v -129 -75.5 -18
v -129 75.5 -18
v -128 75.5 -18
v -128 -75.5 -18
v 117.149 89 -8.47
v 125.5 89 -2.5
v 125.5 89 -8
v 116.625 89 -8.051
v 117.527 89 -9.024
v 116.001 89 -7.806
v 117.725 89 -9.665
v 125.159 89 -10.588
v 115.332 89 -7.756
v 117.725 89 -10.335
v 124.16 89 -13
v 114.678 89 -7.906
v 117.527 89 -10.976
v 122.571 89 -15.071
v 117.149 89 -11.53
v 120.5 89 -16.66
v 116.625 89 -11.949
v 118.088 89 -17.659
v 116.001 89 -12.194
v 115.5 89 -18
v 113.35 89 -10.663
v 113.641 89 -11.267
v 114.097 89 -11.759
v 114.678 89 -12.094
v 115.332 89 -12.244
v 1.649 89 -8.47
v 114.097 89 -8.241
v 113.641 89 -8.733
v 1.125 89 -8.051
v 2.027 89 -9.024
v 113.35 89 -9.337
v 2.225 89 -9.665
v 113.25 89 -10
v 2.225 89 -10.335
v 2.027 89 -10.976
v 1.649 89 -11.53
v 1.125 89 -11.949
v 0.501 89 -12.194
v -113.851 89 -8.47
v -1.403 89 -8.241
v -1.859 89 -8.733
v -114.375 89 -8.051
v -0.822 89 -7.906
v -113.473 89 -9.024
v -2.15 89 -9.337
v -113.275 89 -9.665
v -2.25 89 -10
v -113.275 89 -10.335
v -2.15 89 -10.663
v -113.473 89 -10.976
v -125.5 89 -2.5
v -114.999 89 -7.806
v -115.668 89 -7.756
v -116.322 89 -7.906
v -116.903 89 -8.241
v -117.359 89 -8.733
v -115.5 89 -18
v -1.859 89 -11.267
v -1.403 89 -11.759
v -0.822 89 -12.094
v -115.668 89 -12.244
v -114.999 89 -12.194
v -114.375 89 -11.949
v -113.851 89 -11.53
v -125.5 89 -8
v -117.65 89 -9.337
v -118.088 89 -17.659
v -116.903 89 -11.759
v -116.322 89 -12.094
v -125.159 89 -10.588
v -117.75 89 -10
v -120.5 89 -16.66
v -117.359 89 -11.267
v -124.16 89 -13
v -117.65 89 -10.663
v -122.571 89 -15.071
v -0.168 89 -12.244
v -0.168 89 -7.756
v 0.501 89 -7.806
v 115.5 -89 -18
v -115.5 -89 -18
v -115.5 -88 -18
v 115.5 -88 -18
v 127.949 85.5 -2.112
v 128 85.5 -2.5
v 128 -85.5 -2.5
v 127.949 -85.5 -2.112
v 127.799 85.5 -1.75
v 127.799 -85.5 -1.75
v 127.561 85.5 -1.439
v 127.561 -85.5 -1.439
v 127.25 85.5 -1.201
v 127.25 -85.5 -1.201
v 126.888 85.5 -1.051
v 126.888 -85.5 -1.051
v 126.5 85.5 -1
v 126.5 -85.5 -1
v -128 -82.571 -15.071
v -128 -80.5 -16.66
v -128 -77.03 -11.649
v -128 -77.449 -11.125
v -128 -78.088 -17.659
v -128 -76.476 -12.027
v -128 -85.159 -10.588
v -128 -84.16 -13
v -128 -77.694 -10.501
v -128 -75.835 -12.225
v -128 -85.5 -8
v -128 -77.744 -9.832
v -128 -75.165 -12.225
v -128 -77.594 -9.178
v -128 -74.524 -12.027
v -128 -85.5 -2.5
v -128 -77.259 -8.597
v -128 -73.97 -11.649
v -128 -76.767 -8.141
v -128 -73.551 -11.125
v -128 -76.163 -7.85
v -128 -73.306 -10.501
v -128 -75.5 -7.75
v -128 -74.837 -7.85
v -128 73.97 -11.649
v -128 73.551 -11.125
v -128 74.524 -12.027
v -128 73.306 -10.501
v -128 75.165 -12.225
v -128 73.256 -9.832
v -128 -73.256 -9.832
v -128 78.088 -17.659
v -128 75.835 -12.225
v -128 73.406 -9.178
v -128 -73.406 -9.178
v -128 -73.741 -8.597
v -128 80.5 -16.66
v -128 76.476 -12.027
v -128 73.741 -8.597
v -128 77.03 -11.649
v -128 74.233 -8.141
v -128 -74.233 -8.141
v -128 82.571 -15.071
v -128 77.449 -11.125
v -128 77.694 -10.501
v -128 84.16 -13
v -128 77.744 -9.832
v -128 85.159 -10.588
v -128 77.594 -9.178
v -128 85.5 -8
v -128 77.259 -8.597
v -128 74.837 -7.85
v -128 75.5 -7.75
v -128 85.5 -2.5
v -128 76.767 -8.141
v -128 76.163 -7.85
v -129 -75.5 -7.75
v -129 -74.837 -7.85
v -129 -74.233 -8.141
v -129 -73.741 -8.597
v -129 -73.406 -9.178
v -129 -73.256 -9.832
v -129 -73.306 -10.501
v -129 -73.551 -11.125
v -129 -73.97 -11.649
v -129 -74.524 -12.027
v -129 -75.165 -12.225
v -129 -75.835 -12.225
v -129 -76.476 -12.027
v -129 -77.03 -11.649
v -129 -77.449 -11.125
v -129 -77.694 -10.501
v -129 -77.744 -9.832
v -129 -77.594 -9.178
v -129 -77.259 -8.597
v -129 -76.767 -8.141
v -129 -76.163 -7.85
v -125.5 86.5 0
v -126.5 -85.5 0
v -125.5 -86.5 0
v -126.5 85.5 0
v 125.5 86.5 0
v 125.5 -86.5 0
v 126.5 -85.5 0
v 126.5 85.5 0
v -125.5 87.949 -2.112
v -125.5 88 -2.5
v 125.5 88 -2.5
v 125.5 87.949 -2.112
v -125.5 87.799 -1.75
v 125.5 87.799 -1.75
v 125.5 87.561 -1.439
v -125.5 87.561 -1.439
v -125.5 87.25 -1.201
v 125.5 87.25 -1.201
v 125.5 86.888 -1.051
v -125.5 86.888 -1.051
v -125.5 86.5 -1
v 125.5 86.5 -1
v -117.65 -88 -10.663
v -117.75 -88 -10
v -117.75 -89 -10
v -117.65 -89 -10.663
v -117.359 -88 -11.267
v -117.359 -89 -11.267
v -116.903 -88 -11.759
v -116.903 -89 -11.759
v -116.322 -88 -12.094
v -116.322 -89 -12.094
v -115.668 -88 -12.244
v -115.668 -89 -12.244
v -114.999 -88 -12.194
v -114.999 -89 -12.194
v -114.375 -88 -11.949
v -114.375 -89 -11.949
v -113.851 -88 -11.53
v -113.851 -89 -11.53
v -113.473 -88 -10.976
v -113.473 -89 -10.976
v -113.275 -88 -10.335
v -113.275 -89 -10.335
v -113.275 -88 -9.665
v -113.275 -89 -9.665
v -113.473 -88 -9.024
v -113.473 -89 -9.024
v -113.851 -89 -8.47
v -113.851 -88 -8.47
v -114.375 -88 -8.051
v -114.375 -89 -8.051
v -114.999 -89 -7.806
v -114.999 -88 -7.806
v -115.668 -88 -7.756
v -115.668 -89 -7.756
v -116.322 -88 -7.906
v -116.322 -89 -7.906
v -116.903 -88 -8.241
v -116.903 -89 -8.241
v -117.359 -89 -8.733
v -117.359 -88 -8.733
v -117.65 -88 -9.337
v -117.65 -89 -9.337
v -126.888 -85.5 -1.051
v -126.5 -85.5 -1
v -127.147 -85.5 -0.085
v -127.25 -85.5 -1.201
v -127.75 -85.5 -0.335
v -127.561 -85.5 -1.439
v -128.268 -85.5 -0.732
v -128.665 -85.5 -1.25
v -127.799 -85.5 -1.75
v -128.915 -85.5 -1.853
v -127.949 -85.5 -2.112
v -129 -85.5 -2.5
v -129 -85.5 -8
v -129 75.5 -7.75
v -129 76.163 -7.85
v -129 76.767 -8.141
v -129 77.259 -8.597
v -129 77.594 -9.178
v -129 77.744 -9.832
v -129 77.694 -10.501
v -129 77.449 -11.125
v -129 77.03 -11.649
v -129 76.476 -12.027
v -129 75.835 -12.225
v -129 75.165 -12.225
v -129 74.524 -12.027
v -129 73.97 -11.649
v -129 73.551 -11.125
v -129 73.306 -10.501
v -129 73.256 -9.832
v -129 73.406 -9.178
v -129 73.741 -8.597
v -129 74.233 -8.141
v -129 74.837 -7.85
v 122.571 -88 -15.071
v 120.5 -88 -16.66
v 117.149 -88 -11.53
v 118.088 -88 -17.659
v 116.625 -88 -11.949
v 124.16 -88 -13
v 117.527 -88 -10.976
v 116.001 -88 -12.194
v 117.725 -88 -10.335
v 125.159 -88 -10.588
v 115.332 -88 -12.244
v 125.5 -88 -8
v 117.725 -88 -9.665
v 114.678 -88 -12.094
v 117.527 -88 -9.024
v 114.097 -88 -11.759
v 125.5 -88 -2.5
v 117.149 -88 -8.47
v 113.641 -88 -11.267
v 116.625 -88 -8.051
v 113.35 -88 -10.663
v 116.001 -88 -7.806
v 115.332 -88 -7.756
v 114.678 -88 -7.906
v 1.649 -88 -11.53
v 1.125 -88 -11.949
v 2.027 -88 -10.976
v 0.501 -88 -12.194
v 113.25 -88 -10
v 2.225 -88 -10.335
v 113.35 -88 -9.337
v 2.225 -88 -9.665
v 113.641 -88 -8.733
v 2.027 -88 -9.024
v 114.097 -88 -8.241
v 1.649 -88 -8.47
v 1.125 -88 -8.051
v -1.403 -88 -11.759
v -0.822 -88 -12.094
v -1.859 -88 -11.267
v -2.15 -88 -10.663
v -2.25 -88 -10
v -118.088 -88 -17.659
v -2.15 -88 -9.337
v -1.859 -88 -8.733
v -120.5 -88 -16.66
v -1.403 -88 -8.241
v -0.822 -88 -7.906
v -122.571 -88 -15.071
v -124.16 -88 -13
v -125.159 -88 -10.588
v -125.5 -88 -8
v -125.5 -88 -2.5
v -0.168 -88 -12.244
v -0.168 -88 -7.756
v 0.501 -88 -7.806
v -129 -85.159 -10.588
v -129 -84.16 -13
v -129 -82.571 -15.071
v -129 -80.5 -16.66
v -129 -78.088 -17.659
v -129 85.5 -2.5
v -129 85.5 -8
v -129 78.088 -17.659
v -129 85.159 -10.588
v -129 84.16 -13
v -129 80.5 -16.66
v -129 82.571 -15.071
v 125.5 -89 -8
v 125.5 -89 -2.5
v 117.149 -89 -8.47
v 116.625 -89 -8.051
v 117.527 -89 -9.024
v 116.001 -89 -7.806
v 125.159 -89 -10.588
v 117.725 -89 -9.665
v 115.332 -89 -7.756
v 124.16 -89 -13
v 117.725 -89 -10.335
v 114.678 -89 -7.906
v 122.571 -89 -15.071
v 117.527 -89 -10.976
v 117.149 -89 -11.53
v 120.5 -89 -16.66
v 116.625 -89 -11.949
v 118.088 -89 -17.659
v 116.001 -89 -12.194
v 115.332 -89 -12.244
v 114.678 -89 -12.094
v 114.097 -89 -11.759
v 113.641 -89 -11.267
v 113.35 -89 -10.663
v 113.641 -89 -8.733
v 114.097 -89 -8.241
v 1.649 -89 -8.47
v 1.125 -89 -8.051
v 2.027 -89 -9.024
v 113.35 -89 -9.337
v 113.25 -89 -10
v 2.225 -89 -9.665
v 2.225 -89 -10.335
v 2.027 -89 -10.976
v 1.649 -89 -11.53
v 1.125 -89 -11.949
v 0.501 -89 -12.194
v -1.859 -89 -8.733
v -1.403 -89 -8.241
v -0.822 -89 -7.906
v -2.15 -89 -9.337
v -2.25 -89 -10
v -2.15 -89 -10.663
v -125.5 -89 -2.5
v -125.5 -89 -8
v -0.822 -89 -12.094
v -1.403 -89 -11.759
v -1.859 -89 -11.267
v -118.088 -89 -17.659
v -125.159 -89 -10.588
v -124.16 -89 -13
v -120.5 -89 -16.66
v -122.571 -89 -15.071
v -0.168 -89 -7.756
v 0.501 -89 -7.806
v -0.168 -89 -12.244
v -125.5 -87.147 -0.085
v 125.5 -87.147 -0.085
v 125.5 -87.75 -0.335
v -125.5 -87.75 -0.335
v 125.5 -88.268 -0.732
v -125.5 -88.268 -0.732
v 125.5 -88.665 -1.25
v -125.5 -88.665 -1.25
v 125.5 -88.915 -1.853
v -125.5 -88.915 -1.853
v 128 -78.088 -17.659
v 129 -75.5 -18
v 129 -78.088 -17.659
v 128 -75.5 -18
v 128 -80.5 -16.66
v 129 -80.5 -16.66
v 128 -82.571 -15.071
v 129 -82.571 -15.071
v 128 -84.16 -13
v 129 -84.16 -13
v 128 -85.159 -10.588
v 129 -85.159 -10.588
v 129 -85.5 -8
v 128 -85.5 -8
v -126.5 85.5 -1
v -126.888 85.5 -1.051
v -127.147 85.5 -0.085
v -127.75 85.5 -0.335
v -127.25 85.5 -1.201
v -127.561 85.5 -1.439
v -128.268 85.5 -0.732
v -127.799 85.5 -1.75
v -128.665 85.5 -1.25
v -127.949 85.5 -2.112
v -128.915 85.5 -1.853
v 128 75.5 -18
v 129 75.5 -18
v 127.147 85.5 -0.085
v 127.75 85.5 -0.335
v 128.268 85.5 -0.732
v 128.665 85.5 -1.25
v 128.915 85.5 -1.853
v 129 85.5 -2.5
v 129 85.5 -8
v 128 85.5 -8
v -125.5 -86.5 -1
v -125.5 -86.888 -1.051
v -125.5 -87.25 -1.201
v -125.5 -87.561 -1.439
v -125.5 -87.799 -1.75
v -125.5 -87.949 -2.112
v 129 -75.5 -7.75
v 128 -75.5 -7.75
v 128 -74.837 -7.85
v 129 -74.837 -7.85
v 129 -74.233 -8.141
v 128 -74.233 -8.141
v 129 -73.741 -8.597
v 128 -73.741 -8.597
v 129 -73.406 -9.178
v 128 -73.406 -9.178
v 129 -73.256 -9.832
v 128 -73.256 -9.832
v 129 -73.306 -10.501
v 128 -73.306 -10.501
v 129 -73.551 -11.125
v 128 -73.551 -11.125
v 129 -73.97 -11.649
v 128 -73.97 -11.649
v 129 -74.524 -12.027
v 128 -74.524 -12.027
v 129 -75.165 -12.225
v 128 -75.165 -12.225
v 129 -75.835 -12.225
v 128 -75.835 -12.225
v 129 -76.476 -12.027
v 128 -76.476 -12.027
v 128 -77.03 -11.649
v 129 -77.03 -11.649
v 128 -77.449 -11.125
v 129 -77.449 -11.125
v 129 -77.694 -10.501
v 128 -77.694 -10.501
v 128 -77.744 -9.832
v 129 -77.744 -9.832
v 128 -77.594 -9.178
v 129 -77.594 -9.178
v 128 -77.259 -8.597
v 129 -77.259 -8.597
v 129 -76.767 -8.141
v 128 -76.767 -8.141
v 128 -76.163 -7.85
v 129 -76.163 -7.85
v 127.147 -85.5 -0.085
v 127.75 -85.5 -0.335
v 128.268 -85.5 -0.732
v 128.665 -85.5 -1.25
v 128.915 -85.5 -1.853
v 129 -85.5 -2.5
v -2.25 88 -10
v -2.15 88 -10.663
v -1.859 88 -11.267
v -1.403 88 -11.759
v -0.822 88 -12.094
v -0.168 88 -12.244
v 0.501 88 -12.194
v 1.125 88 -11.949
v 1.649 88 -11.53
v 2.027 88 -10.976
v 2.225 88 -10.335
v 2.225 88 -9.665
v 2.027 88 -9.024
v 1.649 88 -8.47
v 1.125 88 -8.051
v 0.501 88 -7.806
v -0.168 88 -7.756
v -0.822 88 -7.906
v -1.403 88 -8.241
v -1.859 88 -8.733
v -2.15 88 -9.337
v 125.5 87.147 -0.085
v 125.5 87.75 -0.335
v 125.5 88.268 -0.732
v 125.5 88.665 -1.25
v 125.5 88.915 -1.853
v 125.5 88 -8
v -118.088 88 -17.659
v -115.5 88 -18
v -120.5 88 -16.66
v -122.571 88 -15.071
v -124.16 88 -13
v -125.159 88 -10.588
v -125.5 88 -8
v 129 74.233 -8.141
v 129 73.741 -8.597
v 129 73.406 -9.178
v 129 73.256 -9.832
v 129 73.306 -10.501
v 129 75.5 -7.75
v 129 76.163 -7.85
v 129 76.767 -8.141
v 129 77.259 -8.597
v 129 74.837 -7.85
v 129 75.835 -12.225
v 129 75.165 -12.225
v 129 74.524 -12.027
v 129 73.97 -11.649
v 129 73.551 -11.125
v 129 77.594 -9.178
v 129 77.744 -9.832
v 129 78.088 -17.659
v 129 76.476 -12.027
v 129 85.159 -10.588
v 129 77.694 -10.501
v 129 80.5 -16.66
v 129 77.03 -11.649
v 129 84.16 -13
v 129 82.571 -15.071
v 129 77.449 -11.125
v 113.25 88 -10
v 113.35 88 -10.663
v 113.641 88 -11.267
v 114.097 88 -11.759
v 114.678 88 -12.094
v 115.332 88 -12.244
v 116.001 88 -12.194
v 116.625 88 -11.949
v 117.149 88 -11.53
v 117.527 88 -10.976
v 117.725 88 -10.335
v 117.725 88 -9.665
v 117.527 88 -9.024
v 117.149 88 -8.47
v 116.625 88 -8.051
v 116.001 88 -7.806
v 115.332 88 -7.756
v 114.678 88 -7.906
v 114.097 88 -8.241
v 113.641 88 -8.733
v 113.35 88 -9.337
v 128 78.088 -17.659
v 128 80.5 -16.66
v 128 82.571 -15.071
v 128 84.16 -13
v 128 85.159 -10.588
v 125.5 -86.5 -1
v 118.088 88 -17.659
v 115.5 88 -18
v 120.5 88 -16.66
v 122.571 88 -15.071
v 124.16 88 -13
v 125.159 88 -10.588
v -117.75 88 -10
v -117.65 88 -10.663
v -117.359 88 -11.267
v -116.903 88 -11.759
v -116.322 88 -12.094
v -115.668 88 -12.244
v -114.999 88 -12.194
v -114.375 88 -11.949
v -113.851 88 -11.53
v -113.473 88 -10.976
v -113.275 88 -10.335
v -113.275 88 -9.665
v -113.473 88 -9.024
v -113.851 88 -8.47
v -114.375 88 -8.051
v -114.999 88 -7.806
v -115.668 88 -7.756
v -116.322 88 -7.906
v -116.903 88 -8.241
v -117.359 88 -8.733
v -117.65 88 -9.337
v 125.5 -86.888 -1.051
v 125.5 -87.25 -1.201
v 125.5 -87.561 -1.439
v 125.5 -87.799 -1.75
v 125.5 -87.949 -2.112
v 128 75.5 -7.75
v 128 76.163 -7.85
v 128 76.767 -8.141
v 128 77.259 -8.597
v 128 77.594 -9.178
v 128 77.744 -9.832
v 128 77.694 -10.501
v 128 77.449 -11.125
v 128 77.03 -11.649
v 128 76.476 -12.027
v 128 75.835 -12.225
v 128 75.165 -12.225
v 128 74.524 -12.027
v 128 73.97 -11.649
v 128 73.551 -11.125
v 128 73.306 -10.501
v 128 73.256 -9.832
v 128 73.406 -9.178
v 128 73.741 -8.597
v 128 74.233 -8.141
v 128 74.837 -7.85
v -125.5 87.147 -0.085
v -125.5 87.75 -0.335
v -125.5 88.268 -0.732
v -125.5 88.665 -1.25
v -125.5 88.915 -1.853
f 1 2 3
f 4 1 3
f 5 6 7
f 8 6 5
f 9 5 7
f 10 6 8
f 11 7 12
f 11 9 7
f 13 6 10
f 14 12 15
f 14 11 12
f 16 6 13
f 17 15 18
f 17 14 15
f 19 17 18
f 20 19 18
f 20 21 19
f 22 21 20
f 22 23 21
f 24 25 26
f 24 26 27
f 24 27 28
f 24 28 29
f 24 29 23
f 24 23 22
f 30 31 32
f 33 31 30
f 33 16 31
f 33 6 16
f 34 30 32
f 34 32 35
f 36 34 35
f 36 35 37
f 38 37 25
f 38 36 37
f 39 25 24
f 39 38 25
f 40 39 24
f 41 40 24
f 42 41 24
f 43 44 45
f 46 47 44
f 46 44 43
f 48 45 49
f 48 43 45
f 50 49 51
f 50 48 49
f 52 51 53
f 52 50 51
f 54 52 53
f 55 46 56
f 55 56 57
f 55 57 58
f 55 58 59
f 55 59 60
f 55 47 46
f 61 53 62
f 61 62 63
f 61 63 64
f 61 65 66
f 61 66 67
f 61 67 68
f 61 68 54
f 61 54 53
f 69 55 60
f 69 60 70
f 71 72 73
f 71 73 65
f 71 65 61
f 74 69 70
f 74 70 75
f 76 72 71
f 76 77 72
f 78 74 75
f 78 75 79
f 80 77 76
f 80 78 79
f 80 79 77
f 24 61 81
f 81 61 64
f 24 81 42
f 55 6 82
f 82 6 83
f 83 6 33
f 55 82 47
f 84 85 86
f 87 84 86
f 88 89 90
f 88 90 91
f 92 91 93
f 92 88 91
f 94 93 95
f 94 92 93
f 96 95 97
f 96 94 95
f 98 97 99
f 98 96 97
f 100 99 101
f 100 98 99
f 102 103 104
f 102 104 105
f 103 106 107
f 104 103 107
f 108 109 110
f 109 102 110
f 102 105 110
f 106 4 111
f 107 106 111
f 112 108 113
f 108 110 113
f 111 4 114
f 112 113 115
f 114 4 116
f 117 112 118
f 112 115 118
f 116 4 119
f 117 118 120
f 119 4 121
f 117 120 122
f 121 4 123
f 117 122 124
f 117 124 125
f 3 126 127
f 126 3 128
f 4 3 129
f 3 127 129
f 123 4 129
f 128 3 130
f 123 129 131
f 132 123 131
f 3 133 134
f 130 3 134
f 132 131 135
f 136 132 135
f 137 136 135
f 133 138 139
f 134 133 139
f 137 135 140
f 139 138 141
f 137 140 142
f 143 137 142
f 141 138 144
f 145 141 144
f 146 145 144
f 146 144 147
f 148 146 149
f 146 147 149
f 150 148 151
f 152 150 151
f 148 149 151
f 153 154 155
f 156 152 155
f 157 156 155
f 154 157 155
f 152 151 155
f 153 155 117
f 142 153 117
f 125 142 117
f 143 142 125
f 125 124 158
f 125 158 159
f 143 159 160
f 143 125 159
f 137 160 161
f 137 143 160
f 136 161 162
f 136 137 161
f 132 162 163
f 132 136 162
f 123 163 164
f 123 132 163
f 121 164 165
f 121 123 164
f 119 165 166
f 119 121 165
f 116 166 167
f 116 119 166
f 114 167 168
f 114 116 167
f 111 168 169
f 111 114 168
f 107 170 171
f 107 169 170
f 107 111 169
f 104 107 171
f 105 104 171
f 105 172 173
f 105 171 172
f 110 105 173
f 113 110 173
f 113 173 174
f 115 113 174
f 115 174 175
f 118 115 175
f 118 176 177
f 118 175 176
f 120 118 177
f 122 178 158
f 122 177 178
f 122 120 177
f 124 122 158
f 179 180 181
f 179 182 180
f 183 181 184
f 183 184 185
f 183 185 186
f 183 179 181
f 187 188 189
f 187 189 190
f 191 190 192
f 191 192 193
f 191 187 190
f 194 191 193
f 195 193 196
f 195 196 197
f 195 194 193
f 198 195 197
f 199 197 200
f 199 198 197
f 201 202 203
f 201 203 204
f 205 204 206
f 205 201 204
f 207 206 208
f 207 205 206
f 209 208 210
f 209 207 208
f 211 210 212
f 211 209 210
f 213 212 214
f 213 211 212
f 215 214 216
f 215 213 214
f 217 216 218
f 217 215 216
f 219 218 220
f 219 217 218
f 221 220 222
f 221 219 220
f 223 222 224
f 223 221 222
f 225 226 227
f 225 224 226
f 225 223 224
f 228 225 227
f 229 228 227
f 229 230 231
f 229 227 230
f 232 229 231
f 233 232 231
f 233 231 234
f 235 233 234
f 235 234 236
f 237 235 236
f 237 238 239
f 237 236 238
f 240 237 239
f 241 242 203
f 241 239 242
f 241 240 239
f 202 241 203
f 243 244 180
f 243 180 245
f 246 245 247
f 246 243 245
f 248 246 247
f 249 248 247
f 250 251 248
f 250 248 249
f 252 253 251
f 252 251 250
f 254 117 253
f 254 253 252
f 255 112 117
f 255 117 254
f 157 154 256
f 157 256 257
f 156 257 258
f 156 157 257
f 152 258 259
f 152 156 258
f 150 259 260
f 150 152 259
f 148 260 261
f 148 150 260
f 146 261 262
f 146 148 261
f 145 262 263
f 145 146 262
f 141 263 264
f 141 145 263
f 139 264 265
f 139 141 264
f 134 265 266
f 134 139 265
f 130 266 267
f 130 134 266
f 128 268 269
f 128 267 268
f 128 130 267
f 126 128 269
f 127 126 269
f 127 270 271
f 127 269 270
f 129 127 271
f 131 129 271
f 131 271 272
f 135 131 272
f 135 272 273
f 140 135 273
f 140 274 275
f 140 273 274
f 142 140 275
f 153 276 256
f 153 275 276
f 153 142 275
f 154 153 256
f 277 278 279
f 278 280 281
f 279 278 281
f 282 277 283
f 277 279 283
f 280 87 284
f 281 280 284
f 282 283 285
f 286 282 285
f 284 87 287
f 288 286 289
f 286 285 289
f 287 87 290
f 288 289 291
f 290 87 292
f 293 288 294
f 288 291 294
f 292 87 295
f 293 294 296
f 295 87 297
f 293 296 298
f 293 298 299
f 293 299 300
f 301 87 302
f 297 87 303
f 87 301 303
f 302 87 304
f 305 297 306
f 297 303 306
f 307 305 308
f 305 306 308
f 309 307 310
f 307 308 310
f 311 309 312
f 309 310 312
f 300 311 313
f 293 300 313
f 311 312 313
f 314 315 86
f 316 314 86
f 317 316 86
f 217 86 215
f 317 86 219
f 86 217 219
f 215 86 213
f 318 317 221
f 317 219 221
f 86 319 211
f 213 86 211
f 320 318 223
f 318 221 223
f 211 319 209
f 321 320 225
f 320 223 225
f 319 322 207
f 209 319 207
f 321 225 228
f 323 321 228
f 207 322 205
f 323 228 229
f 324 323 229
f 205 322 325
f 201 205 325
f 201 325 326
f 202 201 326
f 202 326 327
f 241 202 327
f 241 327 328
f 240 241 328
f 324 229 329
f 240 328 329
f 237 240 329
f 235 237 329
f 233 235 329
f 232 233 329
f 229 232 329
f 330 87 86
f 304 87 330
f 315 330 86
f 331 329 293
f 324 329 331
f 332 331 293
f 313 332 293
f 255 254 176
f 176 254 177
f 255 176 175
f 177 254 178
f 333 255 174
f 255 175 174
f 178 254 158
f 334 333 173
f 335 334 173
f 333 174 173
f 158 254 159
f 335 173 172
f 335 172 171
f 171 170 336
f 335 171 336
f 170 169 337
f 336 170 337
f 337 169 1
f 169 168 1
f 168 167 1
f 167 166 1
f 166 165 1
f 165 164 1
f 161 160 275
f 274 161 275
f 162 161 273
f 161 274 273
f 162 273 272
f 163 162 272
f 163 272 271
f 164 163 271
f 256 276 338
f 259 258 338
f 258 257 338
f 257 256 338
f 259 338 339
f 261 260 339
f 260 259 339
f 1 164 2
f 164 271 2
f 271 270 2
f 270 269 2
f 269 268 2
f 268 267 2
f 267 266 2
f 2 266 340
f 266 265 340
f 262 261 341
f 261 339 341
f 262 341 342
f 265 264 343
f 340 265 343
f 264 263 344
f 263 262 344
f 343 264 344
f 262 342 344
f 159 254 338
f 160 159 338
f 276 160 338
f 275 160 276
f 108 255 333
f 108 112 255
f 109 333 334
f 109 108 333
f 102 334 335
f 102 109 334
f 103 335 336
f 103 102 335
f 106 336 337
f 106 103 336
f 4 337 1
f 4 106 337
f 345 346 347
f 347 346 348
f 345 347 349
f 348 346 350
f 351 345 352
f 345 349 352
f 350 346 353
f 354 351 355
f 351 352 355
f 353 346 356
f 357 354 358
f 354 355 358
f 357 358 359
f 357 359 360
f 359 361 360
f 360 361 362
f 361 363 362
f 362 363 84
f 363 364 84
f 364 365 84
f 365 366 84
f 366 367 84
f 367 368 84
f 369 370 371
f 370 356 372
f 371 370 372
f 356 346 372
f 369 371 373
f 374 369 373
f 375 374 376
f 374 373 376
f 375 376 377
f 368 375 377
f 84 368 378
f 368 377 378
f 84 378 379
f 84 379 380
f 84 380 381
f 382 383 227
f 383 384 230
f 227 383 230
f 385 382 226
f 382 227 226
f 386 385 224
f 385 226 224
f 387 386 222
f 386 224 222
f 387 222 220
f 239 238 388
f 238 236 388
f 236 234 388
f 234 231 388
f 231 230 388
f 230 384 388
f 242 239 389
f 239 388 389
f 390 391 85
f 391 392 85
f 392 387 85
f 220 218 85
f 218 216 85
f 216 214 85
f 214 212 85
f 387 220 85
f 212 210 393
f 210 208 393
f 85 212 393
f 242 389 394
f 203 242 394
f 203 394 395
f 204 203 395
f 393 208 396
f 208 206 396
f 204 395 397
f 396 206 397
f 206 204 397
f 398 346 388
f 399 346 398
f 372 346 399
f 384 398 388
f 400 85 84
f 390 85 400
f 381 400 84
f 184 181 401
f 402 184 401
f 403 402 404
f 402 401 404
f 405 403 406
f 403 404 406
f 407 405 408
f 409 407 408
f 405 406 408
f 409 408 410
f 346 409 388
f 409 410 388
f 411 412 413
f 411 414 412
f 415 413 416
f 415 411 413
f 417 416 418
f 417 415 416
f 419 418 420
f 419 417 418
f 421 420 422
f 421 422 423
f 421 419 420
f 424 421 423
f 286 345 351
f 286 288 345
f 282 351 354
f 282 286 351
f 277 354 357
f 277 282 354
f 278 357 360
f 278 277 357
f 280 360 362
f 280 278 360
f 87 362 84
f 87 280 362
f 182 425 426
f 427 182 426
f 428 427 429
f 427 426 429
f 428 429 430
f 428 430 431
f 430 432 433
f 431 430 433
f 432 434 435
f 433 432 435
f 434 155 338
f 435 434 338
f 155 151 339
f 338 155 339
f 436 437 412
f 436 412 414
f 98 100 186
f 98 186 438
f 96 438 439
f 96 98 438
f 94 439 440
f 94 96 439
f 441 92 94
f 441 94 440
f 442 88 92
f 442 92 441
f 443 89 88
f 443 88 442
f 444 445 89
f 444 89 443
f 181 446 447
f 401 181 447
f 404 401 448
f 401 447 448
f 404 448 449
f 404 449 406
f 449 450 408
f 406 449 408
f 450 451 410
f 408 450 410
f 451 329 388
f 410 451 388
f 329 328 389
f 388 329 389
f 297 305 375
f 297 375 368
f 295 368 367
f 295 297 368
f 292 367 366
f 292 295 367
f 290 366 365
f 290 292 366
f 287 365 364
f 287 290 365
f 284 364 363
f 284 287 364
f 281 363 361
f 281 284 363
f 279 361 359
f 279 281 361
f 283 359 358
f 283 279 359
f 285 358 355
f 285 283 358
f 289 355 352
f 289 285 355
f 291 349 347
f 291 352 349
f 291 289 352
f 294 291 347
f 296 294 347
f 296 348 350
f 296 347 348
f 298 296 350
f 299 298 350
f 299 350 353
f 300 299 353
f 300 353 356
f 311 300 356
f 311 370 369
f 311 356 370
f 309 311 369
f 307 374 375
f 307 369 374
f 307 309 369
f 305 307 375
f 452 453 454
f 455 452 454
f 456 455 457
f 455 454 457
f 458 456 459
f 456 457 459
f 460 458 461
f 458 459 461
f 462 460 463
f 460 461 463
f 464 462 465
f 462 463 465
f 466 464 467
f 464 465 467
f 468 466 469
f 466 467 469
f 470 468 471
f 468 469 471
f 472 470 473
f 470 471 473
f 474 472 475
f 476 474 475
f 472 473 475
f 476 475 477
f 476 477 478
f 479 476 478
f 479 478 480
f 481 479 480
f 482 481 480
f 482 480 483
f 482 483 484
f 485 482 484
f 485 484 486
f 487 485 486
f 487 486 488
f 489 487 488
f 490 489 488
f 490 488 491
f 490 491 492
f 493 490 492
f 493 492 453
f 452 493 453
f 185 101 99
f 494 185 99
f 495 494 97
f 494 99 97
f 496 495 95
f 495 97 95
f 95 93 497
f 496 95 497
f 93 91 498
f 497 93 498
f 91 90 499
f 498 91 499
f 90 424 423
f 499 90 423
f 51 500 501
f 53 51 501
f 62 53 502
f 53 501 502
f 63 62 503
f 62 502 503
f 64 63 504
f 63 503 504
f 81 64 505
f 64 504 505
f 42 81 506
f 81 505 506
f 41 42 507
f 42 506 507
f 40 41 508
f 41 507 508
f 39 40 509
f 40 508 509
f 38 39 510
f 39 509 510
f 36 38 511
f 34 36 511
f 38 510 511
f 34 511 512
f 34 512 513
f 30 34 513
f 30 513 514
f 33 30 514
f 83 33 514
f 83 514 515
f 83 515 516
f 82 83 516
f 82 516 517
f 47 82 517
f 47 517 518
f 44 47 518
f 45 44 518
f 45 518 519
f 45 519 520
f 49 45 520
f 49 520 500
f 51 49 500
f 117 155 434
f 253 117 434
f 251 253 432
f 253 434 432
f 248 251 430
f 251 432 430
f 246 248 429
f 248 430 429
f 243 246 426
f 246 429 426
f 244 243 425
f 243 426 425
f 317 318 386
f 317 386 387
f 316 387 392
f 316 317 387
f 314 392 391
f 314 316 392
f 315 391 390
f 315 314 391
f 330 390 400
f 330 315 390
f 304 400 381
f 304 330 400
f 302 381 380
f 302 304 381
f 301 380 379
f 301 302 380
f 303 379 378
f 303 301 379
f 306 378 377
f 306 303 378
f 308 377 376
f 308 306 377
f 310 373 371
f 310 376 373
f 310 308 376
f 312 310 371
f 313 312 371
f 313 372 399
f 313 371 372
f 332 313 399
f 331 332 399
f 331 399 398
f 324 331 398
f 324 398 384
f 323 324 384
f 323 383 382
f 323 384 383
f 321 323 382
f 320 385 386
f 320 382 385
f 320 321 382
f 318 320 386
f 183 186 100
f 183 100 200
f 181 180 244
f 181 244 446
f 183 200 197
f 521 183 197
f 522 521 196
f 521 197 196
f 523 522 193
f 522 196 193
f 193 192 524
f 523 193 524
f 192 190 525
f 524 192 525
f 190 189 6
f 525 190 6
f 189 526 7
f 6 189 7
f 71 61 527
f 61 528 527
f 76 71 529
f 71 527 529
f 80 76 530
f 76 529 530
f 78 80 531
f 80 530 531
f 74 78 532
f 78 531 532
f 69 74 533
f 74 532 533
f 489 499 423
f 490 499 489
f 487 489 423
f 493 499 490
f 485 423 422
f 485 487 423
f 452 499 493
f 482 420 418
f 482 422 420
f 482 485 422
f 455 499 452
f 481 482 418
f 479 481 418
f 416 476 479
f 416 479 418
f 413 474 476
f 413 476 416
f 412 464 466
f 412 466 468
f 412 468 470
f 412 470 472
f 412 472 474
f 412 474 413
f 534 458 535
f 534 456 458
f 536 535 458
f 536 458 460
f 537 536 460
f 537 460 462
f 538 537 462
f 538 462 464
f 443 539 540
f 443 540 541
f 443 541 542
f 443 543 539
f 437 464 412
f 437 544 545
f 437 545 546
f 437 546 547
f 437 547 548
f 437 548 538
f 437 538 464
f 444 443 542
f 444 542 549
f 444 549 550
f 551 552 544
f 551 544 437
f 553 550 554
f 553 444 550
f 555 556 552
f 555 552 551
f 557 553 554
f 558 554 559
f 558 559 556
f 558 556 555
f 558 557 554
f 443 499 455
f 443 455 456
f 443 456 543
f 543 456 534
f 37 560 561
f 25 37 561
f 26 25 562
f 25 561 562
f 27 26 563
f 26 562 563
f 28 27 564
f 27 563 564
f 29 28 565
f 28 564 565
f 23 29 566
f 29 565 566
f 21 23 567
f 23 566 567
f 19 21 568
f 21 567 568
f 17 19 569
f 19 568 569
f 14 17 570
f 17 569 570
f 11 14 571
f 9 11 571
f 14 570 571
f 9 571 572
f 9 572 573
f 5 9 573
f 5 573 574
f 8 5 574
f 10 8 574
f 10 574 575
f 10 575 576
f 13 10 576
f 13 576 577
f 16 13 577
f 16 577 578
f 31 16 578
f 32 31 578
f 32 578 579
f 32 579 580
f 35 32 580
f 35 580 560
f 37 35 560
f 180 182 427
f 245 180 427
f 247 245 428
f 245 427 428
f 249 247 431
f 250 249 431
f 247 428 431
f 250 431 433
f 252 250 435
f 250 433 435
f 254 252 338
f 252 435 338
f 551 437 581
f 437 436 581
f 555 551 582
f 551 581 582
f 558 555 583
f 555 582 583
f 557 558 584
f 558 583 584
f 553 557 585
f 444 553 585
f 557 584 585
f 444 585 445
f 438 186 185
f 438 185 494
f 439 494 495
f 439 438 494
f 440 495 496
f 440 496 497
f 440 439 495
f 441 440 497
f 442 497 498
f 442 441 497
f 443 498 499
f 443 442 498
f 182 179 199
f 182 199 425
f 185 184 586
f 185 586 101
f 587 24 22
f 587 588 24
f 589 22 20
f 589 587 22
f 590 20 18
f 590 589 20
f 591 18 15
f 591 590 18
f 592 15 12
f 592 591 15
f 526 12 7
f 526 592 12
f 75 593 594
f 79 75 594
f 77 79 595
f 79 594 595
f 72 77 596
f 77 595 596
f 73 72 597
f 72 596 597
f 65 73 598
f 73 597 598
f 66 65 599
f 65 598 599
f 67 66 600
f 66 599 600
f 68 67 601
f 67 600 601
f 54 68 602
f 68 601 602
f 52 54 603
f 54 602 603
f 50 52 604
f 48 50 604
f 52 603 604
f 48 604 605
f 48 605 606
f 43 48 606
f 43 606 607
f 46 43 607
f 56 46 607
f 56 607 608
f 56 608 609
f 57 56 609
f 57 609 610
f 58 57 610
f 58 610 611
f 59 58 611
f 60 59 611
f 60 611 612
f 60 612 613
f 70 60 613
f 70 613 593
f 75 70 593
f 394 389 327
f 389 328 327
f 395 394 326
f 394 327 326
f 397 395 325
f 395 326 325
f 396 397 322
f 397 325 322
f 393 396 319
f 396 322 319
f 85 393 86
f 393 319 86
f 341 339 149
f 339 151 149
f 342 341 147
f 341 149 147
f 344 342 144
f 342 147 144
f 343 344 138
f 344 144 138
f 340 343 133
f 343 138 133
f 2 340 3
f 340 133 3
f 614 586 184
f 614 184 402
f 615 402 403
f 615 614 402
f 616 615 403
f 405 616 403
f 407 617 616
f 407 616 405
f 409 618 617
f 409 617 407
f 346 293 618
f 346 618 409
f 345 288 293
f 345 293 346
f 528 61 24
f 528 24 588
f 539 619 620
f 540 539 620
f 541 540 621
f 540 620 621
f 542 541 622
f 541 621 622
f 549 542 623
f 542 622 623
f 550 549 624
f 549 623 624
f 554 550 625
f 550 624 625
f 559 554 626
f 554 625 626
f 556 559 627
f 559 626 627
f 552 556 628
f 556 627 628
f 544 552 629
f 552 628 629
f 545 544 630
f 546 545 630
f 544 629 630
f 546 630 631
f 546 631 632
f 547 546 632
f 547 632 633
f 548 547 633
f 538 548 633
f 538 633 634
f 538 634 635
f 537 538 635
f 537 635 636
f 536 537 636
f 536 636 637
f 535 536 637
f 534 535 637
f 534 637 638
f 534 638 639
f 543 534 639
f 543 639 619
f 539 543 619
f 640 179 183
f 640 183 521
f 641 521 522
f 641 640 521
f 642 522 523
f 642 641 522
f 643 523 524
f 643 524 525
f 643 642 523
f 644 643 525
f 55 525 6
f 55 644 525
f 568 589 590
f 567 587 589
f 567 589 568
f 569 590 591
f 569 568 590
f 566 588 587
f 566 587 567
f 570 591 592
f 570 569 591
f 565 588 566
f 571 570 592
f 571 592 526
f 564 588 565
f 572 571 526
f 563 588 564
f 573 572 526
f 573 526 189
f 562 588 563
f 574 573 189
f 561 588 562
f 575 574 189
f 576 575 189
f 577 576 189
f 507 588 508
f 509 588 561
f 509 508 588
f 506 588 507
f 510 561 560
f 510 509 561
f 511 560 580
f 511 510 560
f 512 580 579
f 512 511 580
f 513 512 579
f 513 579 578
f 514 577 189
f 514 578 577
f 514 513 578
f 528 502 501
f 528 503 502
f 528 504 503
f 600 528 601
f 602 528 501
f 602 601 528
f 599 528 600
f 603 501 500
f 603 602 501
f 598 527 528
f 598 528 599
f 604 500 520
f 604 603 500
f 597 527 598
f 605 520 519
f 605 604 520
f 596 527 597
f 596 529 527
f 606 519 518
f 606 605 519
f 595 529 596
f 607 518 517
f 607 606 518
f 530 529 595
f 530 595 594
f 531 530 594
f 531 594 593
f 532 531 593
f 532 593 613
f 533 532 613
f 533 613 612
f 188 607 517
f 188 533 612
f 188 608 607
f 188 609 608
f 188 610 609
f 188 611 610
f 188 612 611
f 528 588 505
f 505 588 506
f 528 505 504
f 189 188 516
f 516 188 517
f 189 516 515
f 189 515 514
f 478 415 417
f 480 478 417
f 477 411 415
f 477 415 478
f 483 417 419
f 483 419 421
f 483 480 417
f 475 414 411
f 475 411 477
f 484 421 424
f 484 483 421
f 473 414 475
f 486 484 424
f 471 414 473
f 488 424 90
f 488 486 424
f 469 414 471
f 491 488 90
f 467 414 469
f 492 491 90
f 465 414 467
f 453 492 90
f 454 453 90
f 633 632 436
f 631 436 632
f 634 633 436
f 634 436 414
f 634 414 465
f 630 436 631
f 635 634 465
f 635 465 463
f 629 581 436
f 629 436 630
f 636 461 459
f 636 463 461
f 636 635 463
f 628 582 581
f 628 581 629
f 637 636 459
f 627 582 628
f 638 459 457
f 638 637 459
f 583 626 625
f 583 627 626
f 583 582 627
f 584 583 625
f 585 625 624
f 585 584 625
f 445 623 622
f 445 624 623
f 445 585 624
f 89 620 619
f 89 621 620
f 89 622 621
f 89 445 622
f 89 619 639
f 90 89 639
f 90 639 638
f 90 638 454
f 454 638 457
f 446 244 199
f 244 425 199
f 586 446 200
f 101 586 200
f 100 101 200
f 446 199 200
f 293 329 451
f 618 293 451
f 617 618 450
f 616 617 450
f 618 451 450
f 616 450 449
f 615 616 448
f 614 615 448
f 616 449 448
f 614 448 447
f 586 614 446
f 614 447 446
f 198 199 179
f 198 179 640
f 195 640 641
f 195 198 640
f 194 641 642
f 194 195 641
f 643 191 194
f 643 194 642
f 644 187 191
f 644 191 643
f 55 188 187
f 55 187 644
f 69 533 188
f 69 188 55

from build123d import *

# Parameters (mm, degrees)
MAIN_PLATE_DEPTH                         = 1
LONG_EDGE_DEPTH                          = 251
LONG_EDGE_FILLETS_R                      = 10
M4_CLEARANCE_HOLE1_D                     = 4.5
M4_CLEARANCE_HOLE1_DEPTH                 = 178
SHORT_EDGE_DEPTH                         = 171
SHORT_EDGE_FILLETS_R                     = 10
M4_CLEARANCE_HOLE2_D                     = 4.5
M4_CLEARANCE_HOLE2_DEPTH                 = 258
LONG_EDGE_FILLETS_OF_OTHER_LONG_EDGE_R   = 10
SHORT_EDGE_FILLETS_OF_OTHER_SHORT_EDGE_R = 10


# Sheet-metal steps are written as plain solids
with BuildPart() as part:
    # Sketch1 → Main Plate (new body)
    with BuildSketch(Plane.XY):
        Polygon((-126.5, -85.5), (-125.5, -86.5), (125.5, -86.5), (126.5, -85.5), (126.5, 85.5), (125.5, 86.5), (-125.5, 86.5), (-126.5, 85.5), align=None)
    extrude(amount=-MAIN_PLATE_DEPTH)

    # Long Edge section (across the edge) → Long Edge (add)
    with BuildSketch(Plane(origin=(-125.5, 88, -1), x_dir=(0, -1, 0), z_dir=(1, 0, 0))):
        with BuildLine():
            Line((-1, 1.5), (-1, 17))
            Line((-1, 17), (0, 17))
            Line((0, 17), (0, 1.5))
            ThreePointArc((0, 1.5), (0.439339828, 0.439339828), (1.5, 0))
            Line((1.5, 0), (1.5, -1))
            ThreePointArc((1.5, -1), (-0.267766953, -0.267766953), (-1, 1.5))
        make_face()
    long_edge = extrude(amount=LONG_EDGE_DEPTH)

    # Long Edge Fillets
    long_edge_fillets_edges = [part.edges().sort_by_distance(p)[0] for p in [
        (-125.5, 88.5, -18),
        (125.5, 88.5, -18),
    ]]
    fillet(long_edge_fillets_edges, radius=LONG_EDGE_FILLETS_R)

    # M4 Clearance Hole1
    with Locations(Plane(origin=(0, 89, 0), x_dir=(1, 0, 0), z_dir=(0, 1, 0))):
        with Locations((-115.5, 10), (115.5, 10), (0, 10)):
            m4_clearance_hole1 = Hole(M4_CLEARANCE_HOLE1_D / 2, depth=M4_CLEARANCE_HOLE1_DEPTH)

    # Short Edge section (across the edge) → Short Edge (add)
    with BuildSketch(Plane(origin=(128, 85.5, -1), x_dir=(-1, 0, 0), z_dir=(0, -1, 0))):
        with BuildLine():
            Line((-1, 1.5), (-1, 17))
            Line((-1, 17), (0, 17))
            Line((0, 17), (0, 1.5))
            ThreePointArc((0, 1.5), (0.439339828, 0.439339828), (1.5, 0))
            Line((1.5, 0), (1.5, -1))
            ThreePointArc((1.5, -1), (-0.267766953, -0.267766953), (-1, 1.5))
        make_face()
    short_edge = extrude(amount=SHORT_EDGE_DEPTH)

    # Short Edge Fillets
    short_edge_fillets_edges = [part.edges().sort_by_distance(p)[0] for p in [
        (128.5, 85.5, -18),
        (128.5, -85.5, -18),
    ]]
    fillet(short_edge_fillets_edges, radius=SHORT_EDGE_FILLETS_R)

    # M4 Clearance Hole2
    with Locations(Plane(origin=(129, 0, 0), x_dir=(0, 0, -1), z_dir=(1, 0, 0))):
        with Locations((10, -75.5), (10, 75.5)):
            m4_clearance_hole2 = Hole(M4_CLEARANCE_HOLE2_D / 2, depth=M4_CLEARANCE_HOLE2_DEPTH)

    # Other Long Edge: Long Edge, M4 Clearance Hole1 across plane
    add(long_edge.mirror(Plane.ZX))
    add(m4_clearance_hole1.mirror(Plane.ZX), mode=Mode.SUBTRACT)

    # Long Edge Fillets of Other Long Edge
    long_edge_fillets_of_other_long_edge_edges = [part.edges().sort_by_distance(p)[0] for p in [
        (-125.5, -88.5, -18),
        (125.5, -88.5, -18),
    ]]
    fillet(long_edge_fillets_of_other_long_edge_edges, radius=LONG_EDGE_FILLETS_OF_OTHER_LONG_EDGE_R)

    # Other Short Edge: Short Edge, M4 Clearance Hole2 across plane
    add(short_edge.mirror(Plane(origin=(0, 0, 0), x_dir=(0, 0, 1), z_dir=(1, 0, 0))))
    add(m4_clearance_hole2.mirror(Plane(origin=(0, 0, 0), x_dir=(0, 0, 1), z_dir=(1, 0, 0))), mode=Mode.SUBTRACT)

    # Short Edge Fillets of Other Short Edge
    short_edge_fillets_of_other_short_edge_edges = [part.edges().sort_by_distance(p)[0] for p in [
        (-128.5, 85.5, -18),
        (-128.5, -85.5, -18),
    ]]
    fillet(short_edge_fillets_of_other_short_edge_edges, radius=SHORT_EDGE_FILLETS_OF_OTHER_SHORT_EDGE_R)


solid = part.part
